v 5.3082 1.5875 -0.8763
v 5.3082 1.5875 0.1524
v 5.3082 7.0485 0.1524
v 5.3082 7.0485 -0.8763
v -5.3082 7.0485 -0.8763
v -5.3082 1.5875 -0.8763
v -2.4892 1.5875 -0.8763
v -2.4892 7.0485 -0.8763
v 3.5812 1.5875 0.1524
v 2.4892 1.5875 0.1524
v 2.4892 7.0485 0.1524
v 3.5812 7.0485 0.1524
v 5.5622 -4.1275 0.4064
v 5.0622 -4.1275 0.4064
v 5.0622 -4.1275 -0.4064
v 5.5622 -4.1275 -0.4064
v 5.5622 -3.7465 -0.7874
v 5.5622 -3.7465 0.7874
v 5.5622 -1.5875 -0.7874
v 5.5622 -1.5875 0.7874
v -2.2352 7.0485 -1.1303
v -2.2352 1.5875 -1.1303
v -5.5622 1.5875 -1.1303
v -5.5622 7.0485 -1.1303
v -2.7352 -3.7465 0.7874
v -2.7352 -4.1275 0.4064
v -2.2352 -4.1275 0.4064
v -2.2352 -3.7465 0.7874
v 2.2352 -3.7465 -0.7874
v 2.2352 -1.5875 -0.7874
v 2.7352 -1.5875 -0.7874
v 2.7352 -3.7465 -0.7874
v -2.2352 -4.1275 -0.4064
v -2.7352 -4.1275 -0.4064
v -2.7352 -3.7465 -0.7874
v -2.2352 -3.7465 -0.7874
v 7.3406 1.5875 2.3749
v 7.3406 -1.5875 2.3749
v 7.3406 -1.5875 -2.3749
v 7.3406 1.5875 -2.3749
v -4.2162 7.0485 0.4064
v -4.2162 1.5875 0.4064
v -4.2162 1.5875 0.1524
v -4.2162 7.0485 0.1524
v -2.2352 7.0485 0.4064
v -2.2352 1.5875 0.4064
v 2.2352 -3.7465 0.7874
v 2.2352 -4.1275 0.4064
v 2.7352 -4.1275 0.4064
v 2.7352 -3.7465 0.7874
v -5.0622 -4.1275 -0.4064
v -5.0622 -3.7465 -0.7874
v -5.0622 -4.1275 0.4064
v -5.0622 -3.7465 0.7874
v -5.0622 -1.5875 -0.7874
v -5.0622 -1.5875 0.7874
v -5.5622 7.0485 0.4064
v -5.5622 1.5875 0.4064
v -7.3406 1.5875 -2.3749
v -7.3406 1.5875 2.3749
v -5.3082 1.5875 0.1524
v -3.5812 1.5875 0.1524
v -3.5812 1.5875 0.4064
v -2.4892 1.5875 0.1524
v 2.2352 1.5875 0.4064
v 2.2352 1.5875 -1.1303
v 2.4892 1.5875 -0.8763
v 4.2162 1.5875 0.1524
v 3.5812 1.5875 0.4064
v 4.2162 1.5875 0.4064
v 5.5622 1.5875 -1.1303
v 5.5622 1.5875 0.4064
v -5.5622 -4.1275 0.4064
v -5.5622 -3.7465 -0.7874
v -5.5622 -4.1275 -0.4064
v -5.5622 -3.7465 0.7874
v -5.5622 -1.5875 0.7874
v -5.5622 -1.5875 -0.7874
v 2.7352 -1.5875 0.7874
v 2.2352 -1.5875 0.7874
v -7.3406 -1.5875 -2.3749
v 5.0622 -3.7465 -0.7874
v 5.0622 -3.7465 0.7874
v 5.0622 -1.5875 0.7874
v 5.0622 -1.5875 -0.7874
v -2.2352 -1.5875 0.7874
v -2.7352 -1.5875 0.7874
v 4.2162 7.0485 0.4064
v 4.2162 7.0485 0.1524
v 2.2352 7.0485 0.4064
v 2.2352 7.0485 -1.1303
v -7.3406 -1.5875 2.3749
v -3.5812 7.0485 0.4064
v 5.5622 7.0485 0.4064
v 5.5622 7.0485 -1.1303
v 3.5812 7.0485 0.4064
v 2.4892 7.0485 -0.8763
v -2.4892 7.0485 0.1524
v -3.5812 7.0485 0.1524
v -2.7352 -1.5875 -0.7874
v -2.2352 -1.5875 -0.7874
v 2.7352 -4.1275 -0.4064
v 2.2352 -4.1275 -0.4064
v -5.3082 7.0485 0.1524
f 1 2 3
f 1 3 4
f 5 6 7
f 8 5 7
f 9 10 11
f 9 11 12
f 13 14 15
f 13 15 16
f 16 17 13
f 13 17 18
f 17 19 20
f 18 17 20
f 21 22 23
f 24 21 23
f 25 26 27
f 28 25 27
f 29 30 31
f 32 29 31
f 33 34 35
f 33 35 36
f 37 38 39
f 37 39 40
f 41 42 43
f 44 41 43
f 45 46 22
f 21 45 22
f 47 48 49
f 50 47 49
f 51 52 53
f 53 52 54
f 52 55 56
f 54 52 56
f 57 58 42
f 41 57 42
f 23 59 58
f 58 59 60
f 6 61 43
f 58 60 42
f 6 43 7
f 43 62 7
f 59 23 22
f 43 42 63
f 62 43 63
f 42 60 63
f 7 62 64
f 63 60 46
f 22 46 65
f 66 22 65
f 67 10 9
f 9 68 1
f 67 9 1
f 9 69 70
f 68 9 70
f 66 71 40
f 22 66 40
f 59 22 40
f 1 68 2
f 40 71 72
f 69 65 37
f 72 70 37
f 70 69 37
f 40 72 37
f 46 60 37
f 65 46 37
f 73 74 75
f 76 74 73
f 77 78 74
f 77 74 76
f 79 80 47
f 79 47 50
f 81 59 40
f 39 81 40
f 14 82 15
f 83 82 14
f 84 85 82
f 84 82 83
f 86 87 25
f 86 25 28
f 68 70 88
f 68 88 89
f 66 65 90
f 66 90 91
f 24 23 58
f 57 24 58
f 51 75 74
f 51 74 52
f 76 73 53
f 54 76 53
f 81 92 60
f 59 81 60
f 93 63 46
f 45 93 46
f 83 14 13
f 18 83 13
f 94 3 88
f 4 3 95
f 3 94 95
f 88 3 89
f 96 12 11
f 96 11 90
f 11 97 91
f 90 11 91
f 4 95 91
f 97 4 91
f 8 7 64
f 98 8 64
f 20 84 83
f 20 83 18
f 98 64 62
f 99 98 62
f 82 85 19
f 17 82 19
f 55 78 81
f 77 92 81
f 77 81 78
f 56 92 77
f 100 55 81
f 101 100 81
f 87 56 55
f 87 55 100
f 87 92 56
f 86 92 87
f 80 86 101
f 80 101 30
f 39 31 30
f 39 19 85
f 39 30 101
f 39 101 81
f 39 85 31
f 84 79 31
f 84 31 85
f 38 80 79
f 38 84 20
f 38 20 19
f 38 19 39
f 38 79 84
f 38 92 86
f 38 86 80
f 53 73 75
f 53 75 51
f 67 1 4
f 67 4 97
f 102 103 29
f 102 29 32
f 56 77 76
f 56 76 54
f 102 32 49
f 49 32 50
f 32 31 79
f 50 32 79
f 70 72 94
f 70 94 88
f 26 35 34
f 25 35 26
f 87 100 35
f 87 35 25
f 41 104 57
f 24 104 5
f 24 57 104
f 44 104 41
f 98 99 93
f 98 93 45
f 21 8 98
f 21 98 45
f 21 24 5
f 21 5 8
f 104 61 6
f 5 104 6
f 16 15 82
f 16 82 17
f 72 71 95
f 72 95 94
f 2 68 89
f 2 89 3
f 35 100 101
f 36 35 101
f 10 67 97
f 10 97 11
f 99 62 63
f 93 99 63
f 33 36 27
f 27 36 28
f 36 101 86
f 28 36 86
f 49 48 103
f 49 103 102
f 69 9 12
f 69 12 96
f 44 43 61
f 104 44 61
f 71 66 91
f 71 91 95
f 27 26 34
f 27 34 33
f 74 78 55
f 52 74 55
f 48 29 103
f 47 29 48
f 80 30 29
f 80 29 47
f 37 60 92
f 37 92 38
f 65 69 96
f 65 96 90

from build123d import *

# Parameters (mm, degrees)
SKETCH1_W           = 14.6812
SKETCH1_H           = 3.175
BOSS_EXTRUDE1_DEPTH = 2.3749
SKETCH2_W           = 0.5
SKETCH2_H           = 1.5748
BOSS_EXTRUDE2_DEPTH = 2.54
CHAMFER1_SIZE       = 0.381
BOSS_EXTRUDE3_DEPTH = 5.461


with BuildPart() as part:
    # Sketch1 → Boss-Extrude1 (new body, symmetric)
    with BuildSketch(Plane.XY):
        Rectangle(SKETCH1_W, SKETCH1_H)
    extrude(amount=BOSS_EXTRUDE1_DEPTH, both=True)

    # Sketch2 → Boss-Extrude2 (add)
    with BuildSketch(Plane.XZ.offset(1.5875)):
        with Locations((-5.3122, 0)):
            Rectangle(SKETCH2_W, SKETCH2_H)
        with Locations((-2.4852, 0)):
            Rectangle(SKETCH2_W, SKETCH2_H)
        with Locations((2.4852, 0)):
            Rectangle(SKETCH2_W, SKETCH2_H)
        with Locations((5.3122, 0)):
            Rectangle(SKETCH2_W, SKETCH2_H)
    extrude(amount=BOSS_EXTRUDE2_DEPTH)

    # Chamfer1
    chamfer1_edges = [part.edges().sort_by_distance(p)[0] for p in [
        (-5.3122, -4.1275, -0.7874),
        (-5.3122, -4.1275, 0.7874),
        (-2.4852, -4.1275, -0.7874),
        (-2.4852, -4.1275, 0.7874),
        (2.4852, -4.1275, 0.7874),
        (2.4852, -4.1275, -0.7874),
        (5.3122, -4.1275, 0.7874),
        (5.3122, -4.1275, -0.7874),
    ]]
    chamfer(chamfer1_edges, length=CHAMFER1_SIZE)

    # Sketch3 → Boss-Extrude3 (add)
    with BuildSketch(Plane(origin=(0, 1.5875, 0), x_dir=(1, 0, 0), z_dir=(0, 1, 0))):
        Polygon((-5.3082, 0.8763), (-2.4892, 0.8763), (-2.4892, -0.1524), (-3.5812, -0.1524), (-3.5812, -0.4064), (-2.2352, -0.4064), (-2.2352, 1.1303), (-5.5622, 1.1303), (-5.5622, -0.4064), (-4.2162, -0.4064), (-4.2162, -0.1524), (-5.3082, -0.1524), align=None)
        Polygon((5.5622, 1.1303), (5.5622, -0.4064), (4.2162, -0.4064), (4.2162, -0.1524), (5.3082, -0.1524), (5.3082, 0.8763), (2.4892, 0.8763), (2.4892, -0.1524), (3.5812, -0.1524), (3.5812, -0.4064), (2.2352, -0.4064), (2.2352, 1.1303), align=None)
    extrude(amount=BOSS_EXTRUDE3_DEPTH)


solid = part.part
